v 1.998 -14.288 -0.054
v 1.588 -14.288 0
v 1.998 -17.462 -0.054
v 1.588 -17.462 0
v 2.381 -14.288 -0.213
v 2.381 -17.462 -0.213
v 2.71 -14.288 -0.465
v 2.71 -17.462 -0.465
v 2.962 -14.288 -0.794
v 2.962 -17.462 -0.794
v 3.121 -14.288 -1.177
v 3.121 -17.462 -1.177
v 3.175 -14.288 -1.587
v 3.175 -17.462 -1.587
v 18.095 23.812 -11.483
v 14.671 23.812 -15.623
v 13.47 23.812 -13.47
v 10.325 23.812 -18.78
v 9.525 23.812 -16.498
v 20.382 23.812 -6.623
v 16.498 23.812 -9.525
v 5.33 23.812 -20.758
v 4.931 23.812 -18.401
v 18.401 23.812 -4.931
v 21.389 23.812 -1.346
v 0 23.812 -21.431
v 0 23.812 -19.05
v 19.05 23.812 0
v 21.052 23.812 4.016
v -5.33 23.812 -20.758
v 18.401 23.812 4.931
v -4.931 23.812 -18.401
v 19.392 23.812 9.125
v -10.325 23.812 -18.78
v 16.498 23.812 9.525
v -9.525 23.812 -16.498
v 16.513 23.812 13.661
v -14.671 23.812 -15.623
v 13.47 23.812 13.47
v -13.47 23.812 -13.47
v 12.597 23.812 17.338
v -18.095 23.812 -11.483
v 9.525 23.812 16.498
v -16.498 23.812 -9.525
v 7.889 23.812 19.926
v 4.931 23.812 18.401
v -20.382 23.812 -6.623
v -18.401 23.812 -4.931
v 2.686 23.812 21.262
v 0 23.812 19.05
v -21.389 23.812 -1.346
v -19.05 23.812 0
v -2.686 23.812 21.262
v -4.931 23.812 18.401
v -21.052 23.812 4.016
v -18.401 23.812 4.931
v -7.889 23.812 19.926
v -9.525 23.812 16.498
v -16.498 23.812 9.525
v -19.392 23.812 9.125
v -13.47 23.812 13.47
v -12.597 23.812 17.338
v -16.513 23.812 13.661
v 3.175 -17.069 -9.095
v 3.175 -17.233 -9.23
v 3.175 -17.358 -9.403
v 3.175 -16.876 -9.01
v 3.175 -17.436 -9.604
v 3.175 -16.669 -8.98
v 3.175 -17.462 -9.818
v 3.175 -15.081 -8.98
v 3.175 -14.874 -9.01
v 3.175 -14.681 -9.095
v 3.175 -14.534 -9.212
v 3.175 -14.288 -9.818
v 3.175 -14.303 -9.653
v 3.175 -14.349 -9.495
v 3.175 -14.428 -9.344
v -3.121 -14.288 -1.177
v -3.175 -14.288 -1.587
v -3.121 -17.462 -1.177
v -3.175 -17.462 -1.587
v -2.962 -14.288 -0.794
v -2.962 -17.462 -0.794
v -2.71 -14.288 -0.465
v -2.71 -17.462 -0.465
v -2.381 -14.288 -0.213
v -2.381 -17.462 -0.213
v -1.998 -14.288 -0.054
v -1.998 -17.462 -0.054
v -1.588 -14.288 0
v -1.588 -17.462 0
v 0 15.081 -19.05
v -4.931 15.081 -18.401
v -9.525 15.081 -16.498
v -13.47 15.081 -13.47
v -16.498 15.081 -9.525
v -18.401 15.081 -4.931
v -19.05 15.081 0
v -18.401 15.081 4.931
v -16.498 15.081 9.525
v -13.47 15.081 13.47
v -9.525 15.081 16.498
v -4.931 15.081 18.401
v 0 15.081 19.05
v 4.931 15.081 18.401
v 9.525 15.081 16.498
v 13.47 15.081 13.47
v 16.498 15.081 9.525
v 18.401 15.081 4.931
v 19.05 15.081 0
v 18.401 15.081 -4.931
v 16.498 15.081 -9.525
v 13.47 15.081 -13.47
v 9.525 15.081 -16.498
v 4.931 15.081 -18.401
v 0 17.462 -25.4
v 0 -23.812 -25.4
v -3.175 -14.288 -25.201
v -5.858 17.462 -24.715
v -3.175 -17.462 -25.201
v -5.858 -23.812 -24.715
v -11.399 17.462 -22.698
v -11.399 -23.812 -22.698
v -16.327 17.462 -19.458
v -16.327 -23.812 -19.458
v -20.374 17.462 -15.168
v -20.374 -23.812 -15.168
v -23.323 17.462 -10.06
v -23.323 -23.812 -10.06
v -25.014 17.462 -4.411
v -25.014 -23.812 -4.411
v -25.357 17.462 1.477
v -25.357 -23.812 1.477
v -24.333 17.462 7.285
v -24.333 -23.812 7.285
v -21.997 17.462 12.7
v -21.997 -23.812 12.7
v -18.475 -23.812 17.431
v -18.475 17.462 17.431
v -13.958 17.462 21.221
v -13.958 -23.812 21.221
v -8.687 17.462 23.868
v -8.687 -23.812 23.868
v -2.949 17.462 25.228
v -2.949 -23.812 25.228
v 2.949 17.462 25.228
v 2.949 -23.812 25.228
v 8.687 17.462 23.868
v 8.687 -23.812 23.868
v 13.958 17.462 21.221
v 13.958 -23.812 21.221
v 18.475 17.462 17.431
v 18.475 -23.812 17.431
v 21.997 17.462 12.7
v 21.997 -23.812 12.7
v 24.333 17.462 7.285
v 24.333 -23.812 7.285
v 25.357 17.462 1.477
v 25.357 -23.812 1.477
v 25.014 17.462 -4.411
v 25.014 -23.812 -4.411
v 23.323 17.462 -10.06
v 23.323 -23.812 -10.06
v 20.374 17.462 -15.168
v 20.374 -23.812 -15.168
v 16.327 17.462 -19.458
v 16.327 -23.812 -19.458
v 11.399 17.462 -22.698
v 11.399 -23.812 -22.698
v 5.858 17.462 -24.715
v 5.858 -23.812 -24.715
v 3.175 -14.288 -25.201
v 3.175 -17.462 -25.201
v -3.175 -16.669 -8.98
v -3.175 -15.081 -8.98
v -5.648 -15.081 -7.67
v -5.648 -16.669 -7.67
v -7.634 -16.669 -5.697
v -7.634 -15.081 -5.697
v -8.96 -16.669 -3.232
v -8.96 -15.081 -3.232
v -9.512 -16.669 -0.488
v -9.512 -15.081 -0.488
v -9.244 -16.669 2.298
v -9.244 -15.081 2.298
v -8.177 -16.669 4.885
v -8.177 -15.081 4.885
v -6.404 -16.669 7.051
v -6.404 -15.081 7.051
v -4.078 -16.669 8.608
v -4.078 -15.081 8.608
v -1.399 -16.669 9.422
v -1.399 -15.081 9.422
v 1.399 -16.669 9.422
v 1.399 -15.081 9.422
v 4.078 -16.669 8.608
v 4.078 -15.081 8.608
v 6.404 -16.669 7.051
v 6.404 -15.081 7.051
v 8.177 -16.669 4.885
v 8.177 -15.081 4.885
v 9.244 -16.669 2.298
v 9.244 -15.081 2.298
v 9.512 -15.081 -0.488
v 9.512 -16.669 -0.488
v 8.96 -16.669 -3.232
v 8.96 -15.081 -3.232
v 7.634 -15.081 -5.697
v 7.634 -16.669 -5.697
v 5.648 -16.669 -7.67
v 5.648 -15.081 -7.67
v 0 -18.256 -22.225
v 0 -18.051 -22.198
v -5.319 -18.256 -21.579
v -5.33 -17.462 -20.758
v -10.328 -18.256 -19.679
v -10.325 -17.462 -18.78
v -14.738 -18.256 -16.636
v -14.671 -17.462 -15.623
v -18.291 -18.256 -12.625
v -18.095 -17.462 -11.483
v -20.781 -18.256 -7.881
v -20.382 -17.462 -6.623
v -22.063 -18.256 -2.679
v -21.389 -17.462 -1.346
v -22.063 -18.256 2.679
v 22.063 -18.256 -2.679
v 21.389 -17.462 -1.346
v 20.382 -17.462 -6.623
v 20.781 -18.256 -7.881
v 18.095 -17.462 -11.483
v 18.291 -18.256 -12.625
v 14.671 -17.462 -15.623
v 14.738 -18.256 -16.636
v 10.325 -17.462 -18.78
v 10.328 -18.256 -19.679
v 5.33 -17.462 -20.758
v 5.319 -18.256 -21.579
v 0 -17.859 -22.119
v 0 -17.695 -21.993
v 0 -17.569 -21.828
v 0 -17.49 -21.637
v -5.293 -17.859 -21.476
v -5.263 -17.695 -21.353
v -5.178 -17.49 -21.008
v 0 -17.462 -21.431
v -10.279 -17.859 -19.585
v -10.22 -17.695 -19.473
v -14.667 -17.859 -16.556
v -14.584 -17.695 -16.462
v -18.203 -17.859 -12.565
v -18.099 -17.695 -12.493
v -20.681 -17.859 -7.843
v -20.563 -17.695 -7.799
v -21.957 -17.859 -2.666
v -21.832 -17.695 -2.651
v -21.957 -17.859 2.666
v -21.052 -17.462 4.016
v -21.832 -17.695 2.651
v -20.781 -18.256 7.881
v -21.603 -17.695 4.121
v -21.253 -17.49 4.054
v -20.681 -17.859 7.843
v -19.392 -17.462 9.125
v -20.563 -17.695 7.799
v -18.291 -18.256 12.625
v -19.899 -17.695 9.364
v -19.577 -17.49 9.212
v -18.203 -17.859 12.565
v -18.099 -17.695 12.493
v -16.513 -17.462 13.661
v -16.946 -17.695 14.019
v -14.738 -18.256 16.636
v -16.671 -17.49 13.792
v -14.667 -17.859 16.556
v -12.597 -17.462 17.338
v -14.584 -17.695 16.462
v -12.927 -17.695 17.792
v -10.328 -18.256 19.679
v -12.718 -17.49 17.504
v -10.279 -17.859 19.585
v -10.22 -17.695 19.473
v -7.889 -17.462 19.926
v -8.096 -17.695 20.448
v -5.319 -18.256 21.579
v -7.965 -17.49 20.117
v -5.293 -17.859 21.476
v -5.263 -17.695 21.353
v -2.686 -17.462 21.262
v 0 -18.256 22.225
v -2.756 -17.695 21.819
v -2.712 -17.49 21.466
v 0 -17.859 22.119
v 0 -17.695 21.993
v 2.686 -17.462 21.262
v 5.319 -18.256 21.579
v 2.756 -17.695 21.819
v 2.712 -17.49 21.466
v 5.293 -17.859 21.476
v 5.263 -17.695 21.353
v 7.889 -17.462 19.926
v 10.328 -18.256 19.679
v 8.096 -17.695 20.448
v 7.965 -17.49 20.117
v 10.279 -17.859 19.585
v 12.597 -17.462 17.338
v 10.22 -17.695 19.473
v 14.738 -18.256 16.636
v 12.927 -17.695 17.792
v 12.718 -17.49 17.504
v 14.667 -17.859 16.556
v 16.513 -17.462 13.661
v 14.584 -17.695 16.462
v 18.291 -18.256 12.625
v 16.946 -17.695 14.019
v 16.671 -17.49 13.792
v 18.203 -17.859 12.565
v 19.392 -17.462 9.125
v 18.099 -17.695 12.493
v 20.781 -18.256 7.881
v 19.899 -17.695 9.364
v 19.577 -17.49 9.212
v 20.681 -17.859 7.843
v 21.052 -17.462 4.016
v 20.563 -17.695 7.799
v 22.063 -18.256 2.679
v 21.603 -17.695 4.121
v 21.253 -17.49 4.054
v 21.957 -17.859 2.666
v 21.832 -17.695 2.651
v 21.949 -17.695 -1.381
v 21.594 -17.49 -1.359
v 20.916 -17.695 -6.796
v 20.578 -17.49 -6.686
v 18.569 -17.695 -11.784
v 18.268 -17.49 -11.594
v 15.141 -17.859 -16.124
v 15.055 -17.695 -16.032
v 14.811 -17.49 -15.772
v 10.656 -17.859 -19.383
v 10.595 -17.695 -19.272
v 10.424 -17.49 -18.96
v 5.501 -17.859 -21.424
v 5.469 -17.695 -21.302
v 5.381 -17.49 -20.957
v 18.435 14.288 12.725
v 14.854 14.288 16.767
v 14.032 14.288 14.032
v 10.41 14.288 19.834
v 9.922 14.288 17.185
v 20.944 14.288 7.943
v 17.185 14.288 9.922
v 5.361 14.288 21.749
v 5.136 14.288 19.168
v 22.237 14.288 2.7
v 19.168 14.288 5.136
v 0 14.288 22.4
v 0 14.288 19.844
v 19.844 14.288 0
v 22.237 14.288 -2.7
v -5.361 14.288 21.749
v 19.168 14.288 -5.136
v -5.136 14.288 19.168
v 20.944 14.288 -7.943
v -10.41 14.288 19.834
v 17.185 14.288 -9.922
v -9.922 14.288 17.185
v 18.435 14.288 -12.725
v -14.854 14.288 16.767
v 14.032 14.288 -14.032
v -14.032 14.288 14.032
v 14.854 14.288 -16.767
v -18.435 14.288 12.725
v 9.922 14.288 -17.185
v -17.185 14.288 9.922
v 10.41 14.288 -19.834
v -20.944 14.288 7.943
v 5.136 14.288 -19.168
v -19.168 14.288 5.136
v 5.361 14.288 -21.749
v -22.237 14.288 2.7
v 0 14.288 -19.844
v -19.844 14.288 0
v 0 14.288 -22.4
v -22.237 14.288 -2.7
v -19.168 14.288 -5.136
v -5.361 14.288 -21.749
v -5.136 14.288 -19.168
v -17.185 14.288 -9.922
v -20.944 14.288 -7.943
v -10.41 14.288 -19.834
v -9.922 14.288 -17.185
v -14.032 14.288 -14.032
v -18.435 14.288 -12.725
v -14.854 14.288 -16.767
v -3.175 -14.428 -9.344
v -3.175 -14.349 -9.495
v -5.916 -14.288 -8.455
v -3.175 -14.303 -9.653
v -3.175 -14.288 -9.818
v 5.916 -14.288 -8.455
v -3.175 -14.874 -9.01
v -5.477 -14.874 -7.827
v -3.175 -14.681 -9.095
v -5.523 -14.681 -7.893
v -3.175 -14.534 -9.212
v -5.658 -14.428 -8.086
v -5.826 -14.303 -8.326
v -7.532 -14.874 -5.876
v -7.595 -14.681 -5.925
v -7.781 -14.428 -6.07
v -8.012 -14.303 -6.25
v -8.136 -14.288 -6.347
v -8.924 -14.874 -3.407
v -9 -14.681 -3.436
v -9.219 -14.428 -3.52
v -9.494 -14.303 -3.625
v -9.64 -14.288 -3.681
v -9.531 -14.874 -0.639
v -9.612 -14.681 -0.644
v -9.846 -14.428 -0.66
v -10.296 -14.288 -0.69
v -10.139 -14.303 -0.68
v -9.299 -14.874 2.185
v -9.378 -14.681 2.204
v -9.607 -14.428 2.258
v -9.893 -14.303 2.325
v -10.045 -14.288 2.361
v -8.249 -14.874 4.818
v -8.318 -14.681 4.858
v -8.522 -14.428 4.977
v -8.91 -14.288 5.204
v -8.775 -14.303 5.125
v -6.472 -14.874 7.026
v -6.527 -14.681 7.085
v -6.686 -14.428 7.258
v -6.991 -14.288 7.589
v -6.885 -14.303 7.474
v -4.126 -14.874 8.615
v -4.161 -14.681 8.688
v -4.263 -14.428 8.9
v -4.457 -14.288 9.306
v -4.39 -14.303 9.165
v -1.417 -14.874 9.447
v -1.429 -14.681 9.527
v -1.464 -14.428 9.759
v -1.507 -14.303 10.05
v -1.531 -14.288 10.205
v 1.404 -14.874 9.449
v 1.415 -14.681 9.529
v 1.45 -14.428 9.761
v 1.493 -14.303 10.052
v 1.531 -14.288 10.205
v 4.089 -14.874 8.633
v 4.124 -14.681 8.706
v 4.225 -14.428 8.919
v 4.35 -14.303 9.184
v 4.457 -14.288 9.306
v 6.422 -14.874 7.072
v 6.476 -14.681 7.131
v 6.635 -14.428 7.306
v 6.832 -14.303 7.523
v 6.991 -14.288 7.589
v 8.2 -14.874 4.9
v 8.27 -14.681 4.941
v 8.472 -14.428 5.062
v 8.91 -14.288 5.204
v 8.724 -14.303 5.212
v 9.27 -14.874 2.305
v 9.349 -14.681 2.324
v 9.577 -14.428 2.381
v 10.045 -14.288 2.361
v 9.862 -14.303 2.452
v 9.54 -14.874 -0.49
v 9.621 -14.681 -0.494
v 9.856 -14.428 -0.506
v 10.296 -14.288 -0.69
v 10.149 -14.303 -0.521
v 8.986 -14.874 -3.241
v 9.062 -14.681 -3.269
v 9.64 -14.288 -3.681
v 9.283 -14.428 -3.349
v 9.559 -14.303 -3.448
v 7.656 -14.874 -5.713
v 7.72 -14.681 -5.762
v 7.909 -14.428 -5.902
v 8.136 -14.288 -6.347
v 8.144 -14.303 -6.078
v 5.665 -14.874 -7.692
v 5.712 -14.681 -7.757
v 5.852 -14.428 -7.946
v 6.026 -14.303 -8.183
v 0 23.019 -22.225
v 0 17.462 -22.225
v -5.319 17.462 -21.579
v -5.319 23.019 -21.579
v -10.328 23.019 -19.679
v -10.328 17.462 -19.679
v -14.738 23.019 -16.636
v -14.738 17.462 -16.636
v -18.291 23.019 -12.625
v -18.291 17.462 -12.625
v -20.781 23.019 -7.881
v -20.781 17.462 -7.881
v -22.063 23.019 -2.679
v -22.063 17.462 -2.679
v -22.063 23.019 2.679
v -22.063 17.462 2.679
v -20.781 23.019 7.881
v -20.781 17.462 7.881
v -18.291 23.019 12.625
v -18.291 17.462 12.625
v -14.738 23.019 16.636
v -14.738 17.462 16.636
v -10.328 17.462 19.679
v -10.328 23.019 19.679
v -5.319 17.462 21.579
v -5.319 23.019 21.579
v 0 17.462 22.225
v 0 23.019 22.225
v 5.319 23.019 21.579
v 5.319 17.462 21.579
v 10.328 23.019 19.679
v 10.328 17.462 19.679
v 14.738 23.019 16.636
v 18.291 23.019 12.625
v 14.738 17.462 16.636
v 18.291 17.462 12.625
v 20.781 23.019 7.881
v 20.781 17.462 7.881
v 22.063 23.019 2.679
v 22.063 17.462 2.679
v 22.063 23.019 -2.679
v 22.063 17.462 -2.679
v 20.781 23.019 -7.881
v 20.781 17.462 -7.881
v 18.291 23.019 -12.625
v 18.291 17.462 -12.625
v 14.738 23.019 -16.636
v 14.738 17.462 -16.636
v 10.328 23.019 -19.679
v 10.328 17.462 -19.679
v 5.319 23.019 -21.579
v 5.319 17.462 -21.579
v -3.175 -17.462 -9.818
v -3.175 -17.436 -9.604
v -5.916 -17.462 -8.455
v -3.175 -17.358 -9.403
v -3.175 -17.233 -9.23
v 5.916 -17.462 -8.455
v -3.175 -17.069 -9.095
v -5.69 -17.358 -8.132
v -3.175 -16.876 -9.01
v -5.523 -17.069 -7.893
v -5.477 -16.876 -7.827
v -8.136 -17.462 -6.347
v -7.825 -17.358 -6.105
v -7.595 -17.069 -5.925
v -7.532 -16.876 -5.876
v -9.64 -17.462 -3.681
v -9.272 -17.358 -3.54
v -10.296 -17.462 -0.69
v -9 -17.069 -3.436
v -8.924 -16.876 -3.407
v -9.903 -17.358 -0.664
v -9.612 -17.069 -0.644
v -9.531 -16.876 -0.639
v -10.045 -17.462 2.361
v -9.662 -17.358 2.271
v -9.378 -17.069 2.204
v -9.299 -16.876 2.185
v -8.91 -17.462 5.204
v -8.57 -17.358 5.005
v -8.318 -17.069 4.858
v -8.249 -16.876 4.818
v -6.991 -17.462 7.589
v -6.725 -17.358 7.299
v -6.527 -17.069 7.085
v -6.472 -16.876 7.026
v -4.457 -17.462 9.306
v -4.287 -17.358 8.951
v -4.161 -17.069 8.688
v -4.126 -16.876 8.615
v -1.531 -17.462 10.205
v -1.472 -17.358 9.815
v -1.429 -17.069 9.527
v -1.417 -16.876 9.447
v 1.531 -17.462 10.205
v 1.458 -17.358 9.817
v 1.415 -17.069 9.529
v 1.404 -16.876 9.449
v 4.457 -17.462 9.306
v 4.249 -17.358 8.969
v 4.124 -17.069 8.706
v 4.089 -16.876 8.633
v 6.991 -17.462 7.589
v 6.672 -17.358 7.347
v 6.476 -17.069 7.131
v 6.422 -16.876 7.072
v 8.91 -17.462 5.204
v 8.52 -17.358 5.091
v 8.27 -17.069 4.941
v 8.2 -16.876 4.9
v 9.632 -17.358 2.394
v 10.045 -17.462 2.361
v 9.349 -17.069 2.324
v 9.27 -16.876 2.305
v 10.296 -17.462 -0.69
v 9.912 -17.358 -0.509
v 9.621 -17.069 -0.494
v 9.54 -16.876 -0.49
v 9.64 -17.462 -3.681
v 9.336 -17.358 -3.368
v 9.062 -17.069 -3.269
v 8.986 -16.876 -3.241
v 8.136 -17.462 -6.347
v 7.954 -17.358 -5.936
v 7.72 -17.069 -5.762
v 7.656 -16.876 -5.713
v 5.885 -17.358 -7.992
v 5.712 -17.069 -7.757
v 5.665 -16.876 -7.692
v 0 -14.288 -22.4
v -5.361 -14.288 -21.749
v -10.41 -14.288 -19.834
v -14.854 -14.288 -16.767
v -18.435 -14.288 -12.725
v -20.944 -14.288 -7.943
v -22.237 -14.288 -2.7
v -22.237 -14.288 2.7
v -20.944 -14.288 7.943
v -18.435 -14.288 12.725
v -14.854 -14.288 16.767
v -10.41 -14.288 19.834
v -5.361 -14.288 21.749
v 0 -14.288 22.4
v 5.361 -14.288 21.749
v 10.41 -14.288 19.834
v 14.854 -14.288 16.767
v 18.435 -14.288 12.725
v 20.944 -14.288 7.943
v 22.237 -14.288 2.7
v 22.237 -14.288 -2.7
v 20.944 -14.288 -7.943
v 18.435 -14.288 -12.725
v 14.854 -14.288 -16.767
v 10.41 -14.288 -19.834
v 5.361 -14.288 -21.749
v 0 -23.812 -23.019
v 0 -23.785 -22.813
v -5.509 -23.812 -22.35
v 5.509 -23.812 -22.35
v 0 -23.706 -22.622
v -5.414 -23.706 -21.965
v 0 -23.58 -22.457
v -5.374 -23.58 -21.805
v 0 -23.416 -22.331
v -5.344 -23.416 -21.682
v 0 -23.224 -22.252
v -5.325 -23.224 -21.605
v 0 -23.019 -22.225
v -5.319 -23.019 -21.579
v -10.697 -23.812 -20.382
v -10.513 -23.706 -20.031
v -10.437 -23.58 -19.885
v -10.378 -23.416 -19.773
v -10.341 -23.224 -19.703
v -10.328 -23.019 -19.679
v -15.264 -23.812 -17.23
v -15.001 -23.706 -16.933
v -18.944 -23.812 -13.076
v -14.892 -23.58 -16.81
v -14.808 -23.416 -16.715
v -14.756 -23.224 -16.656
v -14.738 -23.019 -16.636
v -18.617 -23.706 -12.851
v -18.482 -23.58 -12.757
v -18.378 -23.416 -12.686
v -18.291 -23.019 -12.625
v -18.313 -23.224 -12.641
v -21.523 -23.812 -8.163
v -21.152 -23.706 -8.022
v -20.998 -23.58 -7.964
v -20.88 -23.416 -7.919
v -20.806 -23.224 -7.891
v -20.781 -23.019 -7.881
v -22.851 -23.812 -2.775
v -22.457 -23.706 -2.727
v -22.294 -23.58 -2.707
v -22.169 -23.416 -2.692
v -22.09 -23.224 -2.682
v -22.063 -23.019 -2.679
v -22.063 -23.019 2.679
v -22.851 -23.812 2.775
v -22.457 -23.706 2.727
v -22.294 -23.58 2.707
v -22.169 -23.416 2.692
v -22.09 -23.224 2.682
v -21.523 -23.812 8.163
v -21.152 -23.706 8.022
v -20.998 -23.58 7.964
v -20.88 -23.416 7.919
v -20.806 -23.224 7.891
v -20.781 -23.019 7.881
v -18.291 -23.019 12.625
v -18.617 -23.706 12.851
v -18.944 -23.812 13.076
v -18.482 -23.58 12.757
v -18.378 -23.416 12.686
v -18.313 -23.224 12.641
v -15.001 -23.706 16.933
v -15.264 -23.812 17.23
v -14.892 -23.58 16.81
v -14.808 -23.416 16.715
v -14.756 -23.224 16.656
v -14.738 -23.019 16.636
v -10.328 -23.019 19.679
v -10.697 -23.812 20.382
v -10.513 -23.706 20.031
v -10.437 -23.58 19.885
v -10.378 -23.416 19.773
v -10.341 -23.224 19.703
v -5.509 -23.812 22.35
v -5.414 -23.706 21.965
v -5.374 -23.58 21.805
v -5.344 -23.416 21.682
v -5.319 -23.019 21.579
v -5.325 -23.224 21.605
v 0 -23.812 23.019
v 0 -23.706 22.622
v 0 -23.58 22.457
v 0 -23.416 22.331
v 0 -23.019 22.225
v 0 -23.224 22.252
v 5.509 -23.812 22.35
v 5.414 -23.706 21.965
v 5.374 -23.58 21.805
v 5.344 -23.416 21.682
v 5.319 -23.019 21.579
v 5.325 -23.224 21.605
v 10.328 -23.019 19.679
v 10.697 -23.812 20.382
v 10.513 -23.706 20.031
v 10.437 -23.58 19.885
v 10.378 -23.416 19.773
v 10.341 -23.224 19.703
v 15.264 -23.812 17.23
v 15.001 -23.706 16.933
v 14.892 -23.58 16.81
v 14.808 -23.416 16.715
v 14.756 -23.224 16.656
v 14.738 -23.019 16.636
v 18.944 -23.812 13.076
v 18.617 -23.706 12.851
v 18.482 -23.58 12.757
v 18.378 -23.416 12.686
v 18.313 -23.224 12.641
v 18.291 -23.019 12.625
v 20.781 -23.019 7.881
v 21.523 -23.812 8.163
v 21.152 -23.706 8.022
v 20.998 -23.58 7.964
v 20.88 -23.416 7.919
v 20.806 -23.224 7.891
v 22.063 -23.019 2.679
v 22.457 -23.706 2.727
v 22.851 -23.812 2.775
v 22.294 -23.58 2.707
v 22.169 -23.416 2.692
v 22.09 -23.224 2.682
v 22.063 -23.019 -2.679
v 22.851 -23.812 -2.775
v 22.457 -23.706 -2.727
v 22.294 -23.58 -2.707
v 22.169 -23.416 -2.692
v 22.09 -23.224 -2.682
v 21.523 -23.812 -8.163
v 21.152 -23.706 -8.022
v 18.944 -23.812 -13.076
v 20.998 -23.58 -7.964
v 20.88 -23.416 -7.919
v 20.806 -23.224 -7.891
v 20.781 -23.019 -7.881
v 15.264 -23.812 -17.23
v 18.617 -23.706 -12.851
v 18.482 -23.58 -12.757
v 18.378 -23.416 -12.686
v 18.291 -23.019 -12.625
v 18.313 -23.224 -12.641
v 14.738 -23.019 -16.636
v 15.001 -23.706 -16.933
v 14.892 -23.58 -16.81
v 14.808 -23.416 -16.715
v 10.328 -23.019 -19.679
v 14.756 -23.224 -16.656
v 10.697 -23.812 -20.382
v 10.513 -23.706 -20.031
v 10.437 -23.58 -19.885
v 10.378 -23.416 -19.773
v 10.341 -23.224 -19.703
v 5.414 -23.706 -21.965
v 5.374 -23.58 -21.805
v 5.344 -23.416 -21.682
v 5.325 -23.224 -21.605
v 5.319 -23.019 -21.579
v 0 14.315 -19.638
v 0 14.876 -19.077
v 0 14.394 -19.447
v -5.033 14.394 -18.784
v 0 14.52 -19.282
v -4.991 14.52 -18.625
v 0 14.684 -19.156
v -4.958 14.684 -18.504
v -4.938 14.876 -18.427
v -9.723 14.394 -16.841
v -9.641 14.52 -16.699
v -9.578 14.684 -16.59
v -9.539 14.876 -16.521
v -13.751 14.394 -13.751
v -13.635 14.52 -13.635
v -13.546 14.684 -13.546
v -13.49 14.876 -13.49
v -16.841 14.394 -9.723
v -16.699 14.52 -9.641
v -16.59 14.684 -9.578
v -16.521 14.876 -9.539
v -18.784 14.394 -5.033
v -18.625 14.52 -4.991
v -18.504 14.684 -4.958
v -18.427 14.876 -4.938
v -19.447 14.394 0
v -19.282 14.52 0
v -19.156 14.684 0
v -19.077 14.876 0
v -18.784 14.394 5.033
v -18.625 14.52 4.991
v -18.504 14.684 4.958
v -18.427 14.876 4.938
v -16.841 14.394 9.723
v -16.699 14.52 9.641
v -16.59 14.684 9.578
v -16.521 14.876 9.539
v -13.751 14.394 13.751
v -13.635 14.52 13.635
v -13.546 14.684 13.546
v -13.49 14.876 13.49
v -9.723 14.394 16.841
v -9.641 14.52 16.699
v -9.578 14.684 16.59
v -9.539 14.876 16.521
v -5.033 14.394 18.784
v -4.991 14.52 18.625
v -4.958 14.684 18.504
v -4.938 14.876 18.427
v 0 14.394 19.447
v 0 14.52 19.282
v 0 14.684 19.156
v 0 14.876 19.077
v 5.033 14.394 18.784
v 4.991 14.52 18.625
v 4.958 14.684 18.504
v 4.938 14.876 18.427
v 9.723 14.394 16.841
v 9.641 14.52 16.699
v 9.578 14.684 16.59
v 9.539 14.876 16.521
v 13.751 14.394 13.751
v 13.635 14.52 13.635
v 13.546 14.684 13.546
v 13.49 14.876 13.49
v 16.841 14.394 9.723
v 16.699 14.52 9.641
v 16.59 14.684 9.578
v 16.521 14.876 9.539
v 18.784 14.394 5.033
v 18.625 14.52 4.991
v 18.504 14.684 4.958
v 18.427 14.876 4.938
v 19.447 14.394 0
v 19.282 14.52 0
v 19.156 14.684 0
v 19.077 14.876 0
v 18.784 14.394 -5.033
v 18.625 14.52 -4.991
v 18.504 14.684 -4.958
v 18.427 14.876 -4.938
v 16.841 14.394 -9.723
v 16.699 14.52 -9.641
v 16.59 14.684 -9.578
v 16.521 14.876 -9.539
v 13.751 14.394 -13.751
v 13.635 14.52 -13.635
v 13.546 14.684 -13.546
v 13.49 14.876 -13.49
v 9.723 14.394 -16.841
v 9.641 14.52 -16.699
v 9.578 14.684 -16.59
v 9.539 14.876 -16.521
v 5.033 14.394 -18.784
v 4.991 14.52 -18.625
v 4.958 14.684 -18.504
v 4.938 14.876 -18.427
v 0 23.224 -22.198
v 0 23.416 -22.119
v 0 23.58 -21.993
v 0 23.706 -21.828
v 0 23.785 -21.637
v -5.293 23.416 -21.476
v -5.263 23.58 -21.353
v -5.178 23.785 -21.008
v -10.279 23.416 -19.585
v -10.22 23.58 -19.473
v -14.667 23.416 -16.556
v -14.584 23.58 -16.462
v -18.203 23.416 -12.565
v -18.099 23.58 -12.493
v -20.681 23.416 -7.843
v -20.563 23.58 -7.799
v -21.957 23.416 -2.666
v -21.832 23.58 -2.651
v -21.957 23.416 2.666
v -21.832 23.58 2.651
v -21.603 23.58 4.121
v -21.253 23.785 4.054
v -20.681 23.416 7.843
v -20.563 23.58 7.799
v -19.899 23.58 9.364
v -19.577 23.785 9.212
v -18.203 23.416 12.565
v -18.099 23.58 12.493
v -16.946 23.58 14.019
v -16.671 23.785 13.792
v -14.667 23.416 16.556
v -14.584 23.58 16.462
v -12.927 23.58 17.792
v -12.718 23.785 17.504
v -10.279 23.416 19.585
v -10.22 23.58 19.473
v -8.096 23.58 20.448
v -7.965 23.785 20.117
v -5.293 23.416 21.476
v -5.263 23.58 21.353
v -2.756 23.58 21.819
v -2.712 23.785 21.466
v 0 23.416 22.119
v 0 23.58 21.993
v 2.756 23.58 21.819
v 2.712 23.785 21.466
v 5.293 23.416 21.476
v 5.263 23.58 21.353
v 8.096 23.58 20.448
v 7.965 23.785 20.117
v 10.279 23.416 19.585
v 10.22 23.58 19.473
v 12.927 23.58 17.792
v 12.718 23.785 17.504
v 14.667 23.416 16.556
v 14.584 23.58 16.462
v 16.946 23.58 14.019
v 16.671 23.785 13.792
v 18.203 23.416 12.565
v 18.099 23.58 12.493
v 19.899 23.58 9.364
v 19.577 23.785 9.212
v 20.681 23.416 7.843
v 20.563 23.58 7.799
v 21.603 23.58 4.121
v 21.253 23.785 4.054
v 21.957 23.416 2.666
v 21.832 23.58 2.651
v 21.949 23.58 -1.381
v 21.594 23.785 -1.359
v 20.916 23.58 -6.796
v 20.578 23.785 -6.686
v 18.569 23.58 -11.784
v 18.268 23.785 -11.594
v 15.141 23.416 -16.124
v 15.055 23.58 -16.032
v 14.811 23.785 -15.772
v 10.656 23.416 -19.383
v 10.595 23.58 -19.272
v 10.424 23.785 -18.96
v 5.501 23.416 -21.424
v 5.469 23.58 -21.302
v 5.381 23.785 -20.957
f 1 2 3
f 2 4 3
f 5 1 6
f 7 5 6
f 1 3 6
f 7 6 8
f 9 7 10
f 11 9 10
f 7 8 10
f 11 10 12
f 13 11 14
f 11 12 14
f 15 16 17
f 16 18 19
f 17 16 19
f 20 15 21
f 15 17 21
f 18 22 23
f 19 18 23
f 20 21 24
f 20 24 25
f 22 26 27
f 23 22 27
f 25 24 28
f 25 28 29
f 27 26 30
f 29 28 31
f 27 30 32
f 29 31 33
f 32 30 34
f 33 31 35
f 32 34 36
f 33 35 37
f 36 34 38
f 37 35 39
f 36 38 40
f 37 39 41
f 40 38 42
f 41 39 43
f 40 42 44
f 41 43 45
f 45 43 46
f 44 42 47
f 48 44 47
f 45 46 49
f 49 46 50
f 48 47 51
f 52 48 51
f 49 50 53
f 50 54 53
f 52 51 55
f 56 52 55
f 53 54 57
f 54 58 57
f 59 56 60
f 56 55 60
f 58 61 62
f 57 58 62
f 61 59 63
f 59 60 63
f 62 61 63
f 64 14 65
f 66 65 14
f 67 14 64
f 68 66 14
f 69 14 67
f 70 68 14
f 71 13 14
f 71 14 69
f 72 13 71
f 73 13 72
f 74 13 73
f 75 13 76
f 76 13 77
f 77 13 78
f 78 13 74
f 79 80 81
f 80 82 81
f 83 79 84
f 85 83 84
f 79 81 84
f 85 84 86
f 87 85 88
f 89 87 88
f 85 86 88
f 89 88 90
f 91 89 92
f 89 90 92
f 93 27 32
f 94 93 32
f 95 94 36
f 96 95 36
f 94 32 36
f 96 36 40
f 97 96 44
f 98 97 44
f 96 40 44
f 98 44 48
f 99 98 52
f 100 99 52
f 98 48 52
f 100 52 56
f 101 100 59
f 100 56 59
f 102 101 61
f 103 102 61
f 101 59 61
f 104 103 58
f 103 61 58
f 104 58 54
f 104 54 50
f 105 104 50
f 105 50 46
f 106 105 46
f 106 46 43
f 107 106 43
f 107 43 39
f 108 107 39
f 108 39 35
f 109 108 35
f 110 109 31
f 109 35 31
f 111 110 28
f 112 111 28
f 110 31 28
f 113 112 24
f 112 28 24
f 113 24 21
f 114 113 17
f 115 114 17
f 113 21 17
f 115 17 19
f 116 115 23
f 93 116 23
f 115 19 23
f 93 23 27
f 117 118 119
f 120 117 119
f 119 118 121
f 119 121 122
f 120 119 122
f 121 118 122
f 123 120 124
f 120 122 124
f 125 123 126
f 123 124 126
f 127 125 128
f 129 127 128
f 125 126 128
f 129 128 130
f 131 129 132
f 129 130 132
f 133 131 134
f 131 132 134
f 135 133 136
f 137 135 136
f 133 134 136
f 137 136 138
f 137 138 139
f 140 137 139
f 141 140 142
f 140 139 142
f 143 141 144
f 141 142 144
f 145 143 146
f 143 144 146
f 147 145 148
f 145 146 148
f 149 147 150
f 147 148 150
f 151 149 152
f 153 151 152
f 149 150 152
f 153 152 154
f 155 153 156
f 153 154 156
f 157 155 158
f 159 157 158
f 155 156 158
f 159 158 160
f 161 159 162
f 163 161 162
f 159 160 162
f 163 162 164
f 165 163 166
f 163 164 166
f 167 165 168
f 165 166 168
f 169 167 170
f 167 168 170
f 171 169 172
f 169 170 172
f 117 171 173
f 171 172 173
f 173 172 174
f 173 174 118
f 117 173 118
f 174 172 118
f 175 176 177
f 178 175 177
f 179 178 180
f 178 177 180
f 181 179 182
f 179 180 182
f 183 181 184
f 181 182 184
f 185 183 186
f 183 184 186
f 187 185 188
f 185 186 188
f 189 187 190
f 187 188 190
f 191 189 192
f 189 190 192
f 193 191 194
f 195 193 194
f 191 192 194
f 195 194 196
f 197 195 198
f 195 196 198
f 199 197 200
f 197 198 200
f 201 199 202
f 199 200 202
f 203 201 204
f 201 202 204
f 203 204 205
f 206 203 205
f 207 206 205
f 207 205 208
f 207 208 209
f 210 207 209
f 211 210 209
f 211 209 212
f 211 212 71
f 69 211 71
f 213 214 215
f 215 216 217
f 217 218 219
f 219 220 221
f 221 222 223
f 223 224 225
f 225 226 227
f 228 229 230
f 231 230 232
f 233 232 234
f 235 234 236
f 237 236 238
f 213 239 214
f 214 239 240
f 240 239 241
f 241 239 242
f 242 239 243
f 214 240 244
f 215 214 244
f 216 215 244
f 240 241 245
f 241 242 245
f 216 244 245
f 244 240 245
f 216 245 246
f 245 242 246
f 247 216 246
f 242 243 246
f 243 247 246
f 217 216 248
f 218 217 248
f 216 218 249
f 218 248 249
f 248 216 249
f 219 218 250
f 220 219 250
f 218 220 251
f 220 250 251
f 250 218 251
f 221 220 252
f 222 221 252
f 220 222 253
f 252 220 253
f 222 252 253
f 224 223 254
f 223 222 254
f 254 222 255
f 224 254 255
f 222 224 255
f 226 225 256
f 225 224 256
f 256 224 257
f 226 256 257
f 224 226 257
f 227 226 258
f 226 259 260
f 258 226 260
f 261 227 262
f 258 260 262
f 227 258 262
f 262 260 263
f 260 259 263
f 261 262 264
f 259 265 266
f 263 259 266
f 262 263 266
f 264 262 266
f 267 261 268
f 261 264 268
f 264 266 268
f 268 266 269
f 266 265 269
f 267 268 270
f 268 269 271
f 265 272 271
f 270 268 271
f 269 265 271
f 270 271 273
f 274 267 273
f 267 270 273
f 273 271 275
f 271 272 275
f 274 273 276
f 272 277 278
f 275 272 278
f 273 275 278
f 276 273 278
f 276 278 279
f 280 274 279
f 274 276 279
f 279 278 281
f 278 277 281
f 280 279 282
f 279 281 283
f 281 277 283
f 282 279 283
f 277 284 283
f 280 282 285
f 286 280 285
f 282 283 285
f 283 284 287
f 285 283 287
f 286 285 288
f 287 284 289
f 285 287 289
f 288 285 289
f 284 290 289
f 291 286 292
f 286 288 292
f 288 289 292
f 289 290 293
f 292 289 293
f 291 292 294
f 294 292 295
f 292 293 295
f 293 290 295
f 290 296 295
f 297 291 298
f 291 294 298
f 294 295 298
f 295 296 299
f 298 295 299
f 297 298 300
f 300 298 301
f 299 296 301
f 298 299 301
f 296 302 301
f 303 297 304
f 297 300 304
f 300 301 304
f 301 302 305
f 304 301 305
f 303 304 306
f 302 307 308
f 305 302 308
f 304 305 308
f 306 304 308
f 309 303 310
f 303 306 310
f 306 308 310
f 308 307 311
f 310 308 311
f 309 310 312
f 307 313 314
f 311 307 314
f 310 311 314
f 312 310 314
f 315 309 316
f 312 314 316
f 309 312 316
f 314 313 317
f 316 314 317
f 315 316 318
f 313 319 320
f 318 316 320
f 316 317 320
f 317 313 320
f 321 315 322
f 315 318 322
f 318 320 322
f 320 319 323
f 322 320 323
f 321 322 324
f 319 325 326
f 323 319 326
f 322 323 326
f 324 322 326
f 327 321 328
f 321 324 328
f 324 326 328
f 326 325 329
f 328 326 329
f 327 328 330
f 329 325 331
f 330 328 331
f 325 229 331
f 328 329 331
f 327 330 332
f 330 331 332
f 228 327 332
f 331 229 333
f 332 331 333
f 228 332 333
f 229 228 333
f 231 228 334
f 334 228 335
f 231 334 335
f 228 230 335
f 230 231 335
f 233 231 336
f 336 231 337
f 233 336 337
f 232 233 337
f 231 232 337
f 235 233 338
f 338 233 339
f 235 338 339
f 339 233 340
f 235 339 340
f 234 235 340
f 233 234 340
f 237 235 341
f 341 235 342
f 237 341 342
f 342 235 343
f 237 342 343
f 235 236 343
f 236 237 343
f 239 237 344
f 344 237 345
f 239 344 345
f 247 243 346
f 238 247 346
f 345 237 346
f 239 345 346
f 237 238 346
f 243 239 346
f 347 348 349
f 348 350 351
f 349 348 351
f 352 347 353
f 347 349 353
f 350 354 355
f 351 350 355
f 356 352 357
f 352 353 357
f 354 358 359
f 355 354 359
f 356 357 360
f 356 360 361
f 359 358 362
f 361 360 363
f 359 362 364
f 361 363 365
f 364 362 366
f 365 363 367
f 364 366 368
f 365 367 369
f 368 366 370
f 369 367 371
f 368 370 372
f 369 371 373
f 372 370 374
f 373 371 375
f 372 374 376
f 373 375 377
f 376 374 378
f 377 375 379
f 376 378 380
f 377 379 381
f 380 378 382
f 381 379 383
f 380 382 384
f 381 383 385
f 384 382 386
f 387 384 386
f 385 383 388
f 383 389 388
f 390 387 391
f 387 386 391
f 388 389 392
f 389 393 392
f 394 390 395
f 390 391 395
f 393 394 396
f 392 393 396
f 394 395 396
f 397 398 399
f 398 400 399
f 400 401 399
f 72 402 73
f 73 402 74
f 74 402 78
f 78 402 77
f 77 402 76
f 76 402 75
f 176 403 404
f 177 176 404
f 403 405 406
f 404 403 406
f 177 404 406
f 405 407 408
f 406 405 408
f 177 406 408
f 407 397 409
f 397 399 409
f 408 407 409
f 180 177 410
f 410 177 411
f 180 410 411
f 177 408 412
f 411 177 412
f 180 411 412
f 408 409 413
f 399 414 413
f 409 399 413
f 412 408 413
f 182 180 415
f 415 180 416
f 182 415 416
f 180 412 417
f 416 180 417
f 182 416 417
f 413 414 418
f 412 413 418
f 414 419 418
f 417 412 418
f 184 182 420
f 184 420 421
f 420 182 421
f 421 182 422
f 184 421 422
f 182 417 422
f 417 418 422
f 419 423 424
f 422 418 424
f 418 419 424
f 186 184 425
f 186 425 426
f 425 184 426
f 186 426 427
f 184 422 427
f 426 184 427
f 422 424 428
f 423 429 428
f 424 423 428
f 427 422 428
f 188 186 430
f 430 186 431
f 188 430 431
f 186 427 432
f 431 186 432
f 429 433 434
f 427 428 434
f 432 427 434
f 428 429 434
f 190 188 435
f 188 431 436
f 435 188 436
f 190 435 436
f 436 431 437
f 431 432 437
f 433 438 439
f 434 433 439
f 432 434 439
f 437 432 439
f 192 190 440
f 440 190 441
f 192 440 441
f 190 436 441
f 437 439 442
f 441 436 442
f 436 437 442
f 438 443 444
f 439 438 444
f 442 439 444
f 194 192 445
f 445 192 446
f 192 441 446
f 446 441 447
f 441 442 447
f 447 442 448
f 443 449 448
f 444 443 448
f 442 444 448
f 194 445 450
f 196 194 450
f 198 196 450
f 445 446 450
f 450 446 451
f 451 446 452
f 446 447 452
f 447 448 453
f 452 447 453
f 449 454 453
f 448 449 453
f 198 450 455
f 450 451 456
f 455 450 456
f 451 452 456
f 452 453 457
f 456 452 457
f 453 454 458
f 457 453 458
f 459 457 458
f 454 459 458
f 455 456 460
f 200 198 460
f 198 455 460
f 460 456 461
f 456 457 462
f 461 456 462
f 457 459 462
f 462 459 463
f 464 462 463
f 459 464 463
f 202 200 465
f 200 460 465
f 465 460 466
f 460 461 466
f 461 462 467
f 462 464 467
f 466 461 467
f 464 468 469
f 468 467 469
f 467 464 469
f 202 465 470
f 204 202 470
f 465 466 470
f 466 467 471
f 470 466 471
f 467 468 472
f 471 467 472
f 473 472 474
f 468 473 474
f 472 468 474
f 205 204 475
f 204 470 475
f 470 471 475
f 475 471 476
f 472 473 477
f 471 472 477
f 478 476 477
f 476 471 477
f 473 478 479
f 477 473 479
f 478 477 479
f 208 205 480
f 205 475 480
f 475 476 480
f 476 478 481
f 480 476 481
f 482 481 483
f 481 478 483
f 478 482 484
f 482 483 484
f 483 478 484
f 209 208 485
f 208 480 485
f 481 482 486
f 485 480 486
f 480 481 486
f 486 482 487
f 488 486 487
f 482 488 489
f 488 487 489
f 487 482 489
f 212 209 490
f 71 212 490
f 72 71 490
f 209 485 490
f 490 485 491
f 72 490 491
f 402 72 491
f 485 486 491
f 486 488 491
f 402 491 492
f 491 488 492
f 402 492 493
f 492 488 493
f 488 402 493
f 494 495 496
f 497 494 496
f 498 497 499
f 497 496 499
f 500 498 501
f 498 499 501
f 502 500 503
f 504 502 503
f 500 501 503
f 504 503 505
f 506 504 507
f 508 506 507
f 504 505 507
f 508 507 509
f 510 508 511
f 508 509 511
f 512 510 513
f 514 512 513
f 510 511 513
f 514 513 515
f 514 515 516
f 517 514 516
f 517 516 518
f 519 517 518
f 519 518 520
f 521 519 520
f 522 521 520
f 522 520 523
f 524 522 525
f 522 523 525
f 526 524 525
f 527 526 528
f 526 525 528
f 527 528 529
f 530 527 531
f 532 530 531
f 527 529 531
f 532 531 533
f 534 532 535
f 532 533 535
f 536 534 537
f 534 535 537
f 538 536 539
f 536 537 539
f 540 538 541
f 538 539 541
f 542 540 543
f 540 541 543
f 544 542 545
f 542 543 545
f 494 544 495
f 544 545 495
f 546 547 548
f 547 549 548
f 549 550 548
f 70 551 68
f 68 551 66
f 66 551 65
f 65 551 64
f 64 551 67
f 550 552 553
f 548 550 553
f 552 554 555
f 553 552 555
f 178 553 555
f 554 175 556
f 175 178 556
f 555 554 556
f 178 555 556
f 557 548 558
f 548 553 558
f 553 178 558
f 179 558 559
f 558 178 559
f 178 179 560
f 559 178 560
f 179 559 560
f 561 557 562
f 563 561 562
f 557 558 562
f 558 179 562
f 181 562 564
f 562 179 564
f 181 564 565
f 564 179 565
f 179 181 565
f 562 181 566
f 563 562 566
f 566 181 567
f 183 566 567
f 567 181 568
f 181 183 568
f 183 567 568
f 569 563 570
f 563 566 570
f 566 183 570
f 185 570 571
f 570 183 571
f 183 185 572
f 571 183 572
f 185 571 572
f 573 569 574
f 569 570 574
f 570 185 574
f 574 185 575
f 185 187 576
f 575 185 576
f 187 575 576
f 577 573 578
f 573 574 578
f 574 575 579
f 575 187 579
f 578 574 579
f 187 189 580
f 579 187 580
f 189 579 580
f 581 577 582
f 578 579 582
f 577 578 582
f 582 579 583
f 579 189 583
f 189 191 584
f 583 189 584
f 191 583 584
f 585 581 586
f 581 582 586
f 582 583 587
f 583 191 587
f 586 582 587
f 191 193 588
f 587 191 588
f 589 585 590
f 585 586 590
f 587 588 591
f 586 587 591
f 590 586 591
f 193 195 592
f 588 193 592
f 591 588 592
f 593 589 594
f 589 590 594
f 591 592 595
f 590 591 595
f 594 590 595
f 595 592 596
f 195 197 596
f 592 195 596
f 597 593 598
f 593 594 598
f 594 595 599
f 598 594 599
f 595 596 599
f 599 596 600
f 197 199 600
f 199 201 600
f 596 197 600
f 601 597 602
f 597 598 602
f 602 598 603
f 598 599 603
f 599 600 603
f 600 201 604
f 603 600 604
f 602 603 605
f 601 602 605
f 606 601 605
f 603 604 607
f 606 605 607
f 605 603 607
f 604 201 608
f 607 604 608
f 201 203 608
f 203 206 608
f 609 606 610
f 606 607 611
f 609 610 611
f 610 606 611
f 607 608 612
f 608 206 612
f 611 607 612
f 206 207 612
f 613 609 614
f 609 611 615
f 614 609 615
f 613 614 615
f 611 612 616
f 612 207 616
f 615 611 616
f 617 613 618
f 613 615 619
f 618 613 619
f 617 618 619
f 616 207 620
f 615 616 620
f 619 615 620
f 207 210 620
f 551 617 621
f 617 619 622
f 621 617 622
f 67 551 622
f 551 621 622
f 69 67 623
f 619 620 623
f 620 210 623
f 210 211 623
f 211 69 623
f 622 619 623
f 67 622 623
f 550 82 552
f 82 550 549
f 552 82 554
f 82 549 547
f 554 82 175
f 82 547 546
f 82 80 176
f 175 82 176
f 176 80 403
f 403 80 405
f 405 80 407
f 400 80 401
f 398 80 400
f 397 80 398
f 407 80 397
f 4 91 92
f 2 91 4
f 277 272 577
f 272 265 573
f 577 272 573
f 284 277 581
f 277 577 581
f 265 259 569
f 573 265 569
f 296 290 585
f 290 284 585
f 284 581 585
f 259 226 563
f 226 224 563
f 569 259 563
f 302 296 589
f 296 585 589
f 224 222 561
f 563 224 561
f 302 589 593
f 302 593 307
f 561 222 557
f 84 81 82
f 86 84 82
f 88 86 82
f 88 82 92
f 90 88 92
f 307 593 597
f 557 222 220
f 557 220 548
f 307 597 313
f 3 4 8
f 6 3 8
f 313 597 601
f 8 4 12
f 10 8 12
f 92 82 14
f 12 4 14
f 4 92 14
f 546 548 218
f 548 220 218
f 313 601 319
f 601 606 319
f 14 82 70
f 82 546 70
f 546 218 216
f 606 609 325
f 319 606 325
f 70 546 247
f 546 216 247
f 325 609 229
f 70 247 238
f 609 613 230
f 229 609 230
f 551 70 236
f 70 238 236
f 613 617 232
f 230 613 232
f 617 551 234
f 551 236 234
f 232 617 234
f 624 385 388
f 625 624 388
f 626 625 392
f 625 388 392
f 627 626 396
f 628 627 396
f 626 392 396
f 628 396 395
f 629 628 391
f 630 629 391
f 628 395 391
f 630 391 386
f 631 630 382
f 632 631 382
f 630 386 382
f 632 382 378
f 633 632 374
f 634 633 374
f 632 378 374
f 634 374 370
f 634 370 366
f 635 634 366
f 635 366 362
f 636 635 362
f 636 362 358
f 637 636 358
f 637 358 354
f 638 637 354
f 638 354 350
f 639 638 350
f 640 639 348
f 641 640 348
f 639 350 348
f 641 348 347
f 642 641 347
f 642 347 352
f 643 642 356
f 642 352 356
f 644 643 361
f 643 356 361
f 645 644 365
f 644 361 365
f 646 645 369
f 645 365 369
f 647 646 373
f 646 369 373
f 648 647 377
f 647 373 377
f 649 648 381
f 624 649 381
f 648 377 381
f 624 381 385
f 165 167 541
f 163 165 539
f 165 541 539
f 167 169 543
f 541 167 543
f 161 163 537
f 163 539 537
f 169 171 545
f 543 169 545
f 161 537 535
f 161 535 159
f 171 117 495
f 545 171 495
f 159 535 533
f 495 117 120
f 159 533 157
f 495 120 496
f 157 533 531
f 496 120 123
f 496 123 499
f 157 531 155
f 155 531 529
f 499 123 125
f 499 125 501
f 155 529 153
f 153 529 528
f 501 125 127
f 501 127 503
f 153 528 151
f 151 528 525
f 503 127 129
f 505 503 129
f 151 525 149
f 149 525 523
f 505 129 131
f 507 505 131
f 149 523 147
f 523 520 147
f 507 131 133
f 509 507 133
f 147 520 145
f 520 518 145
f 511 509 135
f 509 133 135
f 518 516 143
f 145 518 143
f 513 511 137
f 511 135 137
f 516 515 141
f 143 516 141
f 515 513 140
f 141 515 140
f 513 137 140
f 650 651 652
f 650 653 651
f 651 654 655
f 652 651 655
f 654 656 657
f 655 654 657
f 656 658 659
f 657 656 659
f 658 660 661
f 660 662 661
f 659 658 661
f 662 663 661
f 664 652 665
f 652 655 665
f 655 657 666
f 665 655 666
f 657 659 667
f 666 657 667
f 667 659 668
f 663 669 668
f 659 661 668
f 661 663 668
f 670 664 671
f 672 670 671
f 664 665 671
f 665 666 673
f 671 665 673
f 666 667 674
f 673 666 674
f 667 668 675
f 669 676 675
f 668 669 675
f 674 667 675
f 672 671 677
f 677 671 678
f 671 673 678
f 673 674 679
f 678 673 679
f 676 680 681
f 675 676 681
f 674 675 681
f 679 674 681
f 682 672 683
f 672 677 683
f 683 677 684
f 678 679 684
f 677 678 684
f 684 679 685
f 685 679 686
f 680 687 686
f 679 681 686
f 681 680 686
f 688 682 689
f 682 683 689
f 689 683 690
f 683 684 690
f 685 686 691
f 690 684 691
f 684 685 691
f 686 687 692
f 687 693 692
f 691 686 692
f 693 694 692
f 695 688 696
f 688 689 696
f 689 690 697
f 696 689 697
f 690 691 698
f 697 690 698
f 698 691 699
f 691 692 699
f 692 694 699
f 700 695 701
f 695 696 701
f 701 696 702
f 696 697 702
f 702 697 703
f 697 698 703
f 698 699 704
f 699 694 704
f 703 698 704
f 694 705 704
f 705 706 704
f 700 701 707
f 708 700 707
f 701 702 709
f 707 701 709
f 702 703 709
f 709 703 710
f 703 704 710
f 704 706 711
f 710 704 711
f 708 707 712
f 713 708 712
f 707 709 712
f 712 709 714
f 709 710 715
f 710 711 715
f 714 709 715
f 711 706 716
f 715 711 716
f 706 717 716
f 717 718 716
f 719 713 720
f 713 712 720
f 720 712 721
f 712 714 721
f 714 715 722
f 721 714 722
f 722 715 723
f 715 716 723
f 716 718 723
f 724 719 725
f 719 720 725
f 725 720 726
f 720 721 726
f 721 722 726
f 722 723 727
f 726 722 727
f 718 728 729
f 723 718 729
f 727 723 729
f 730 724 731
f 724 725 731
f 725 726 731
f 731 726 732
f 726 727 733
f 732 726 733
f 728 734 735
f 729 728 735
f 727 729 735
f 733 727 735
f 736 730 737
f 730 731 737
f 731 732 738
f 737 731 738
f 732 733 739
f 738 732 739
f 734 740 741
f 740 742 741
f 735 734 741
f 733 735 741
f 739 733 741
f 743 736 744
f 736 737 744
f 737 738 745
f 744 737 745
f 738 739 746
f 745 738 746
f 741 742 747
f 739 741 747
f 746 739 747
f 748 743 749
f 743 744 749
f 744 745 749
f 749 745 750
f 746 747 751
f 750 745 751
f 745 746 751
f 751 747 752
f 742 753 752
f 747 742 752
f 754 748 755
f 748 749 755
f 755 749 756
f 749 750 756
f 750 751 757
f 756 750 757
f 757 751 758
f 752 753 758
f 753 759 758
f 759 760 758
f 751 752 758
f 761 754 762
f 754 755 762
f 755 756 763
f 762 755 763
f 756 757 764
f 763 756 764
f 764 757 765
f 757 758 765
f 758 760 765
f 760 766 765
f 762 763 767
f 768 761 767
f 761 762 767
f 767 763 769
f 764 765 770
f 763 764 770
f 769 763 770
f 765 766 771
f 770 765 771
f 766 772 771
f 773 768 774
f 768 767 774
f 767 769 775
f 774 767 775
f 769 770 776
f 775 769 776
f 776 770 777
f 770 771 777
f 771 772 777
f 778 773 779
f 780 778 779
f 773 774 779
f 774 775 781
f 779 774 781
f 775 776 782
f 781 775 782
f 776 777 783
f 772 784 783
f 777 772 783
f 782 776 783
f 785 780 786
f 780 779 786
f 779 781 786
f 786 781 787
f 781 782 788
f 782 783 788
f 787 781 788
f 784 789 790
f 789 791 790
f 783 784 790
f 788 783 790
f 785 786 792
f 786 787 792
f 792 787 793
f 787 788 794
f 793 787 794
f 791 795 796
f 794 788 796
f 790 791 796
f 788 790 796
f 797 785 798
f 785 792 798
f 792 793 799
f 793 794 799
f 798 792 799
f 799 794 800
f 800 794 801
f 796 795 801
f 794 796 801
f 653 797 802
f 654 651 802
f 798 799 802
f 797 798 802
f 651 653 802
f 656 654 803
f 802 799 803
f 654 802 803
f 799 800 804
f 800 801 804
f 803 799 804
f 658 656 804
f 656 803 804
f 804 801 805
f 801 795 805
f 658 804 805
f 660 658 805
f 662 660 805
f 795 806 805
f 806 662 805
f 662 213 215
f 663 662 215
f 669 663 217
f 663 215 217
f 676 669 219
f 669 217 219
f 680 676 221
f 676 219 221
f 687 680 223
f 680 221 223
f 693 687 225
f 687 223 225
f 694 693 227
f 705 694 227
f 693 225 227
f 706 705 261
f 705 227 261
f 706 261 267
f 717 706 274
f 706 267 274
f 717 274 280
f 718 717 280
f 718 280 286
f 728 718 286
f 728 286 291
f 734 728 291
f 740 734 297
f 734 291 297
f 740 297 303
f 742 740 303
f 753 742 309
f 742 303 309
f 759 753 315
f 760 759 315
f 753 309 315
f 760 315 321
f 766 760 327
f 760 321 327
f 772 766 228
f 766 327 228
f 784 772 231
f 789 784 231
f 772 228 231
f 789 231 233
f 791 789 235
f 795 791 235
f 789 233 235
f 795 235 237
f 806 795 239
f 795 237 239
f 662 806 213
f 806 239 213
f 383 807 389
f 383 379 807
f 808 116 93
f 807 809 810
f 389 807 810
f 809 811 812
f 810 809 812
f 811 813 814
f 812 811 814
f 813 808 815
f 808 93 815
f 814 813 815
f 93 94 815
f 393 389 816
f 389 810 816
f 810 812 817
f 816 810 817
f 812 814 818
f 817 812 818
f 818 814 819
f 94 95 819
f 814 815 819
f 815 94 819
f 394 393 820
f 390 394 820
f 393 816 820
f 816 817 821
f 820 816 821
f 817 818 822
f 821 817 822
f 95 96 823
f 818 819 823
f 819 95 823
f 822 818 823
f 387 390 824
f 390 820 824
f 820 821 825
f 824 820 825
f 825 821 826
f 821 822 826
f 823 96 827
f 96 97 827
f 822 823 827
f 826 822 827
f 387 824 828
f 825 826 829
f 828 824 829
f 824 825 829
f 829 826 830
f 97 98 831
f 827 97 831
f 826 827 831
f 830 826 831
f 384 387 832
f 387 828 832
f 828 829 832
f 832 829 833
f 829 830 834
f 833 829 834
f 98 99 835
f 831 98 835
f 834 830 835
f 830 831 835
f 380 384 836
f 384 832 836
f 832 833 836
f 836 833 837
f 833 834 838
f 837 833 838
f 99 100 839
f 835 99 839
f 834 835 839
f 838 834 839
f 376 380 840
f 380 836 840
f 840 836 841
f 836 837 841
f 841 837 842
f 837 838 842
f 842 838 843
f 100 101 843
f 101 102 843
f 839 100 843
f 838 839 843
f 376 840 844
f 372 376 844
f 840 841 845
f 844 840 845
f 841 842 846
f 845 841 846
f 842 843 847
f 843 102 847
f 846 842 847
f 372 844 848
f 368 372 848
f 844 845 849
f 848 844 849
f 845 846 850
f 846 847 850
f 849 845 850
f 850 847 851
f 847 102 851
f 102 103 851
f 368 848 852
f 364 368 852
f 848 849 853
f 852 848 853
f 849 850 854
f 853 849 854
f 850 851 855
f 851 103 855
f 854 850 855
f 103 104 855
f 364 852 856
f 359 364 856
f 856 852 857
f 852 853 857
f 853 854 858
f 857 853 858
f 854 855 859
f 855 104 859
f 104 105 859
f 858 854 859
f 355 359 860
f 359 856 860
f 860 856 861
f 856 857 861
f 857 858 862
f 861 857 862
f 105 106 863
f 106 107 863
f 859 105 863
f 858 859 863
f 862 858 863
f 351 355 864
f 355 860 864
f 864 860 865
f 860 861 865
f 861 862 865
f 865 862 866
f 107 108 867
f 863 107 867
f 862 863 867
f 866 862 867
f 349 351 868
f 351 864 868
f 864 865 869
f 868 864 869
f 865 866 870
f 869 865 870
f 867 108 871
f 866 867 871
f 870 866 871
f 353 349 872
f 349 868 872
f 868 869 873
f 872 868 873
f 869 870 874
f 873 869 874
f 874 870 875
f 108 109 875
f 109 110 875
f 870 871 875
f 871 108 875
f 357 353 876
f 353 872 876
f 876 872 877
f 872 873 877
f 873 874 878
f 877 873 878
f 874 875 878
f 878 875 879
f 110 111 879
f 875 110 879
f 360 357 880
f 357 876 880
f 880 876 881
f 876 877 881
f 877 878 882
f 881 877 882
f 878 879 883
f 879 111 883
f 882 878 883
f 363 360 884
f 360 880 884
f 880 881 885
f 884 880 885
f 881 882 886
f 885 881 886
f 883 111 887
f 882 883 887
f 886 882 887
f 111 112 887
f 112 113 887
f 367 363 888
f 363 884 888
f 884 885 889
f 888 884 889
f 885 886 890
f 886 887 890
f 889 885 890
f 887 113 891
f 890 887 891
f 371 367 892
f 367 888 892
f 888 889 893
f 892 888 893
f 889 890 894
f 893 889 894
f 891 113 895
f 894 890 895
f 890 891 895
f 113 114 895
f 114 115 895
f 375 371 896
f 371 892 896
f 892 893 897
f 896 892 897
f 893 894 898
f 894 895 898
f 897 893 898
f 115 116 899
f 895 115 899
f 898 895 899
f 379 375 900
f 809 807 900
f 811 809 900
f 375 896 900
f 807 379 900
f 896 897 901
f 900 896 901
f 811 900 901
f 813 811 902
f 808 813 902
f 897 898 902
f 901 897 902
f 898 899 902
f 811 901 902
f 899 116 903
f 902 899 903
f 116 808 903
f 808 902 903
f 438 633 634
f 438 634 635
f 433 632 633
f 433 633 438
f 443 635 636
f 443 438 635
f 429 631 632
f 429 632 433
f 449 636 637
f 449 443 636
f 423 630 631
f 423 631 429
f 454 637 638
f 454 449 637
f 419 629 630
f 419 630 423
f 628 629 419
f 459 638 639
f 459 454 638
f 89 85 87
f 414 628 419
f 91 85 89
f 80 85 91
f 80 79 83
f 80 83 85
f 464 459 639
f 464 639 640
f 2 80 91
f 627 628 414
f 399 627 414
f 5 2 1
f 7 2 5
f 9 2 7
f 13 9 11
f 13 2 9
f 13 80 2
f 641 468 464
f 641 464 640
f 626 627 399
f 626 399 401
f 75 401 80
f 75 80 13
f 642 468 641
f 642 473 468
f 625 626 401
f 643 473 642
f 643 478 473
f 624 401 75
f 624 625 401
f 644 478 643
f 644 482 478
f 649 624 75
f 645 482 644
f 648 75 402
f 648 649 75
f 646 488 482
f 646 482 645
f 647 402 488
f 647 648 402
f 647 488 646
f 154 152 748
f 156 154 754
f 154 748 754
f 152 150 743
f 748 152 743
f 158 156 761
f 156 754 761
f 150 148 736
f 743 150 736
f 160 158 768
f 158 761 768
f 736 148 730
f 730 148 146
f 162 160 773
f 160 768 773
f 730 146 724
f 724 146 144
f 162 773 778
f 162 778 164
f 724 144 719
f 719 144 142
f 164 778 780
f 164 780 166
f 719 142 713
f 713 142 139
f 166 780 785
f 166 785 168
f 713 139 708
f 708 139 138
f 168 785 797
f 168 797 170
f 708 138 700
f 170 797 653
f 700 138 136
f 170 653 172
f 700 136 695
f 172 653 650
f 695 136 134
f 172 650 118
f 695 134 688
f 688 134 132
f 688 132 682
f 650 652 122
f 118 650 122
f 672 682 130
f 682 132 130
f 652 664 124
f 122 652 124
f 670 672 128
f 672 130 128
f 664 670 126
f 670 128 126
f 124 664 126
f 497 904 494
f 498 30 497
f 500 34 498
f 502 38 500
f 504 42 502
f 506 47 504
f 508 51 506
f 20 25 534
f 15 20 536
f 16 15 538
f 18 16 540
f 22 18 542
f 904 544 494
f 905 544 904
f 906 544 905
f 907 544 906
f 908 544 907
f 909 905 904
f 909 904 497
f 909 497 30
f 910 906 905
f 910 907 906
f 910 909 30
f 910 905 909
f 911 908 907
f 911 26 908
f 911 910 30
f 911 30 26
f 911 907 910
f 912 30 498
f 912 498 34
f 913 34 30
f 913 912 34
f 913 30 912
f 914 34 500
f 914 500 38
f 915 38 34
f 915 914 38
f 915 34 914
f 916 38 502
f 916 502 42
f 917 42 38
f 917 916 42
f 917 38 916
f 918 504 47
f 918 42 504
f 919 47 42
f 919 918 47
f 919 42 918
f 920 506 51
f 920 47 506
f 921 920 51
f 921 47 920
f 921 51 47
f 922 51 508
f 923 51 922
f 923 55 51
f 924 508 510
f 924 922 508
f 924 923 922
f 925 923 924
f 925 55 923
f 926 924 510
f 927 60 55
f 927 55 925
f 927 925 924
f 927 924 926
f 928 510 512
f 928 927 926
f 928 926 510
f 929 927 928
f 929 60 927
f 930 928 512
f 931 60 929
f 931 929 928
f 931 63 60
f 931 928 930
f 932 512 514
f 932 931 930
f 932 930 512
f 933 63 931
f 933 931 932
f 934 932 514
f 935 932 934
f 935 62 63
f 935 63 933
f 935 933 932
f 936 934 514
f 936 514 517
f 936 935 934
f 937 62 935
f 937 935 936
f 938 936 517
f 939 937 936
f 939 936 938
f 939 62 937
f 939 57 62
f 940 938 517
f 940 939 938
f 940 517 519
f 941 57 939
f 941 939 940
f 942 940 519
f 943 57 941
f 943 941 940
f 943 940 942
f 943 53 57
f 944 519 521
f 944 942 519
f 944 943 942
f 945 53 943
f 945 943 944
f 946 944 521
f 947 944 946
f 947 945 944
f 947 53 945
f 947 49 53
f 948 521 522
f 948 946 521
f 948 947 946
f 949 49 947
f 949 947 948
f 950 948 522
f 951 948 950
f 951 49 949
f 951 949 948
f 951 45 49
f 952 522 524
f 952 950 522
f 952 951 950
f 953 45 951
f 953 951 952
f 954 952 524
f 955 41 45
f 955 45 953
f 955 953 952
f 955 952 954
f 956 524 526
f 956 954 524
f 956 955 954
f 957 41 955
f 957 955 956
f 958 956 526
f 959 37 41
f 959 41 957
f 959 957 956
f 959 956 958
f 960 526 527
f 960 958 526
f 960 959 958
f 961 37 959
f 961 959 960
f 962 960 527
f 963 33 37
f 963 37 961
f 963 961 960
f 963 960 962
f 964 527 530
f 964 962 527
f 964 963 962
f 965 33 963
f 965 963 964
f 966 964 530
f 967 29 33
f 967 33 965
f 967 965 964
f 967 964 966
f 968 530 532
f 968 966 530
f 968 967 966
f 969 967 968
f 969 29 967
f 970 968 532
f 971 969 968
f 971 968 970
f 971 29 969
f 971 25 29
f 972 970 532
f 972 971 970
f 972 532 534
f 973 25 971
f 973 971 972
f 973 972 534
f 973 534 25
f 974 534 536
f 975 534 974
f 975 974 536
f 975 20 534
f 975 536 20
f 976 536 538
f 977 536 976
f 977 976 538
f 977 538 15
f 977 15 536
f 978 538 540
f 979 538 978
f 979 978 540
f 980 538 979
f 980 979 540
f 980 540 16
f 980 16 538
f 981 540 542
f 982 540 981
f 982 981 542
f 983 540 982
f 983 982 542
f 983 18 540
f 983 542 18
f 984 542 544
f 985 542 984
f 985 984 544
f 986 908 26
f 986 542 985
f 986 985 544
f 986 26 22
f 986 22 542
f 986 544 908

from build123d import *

# Parameters (mm, degrees)
FILLET1_R           = 0.79375
SKETCH2_W           = 6.35
SKETCH2_H           = 25.200781238
BOSS_EXTRUDE1_DEPTH = 3.175
FILLET2_R           = 1.5875


with BuildPart() as part:
    # Sketch1 → Revolve1 (revolve)
    with BuildSketch(Plane(origin=(0, 0, 0), x_dir=(0, 0, -1), z_dir=(1, 0, 0))):
        Polygon((22.225, 23.8125), (22.225, 17.4625), (25.4, 17.4625), (25.4, -23.8125), (22.225, -23.8125), (22.225, -17.4625), (9.525, -17.4625), (9.525, -14.2875), (22.4, -14.2875), (22.4, 14.2875), (19.05, 14.2875), (19.05, 23.8125), align=None)
    revolve(axis=Axis((0, -32.325211936, 0), (0, 1, 0)))

    # Fillet1
    fillet1_edges = [part.edges().sort_by_distance(p)[0] for p in [
        (0, -14.2875, 9.525),
        (0, -17.4625, 9.525),
        (0, -17.4625, 22.225),
        (0, -23.8125, 22.225),
        (0, 23.8125, 22.225),
        (0, 14.2875, 19.05),
    ]]
    fillet(fillet1_edges, radius=FILLET1_R)

    # Sketch2 → Boss-Extrude1 (add)
    with BuildSketch(Plane(origin=(0, -14.2875, 0), x_dir=(1, 0, 0), z_dir=(0, 1, 0))):
        with Locations((0, 12.600390619)):
            Rectangle(SKETCH2_W, SKETCH2_H)
    extrude(amount=-BOSS_EXTRUDE1_DEPTH)

    # Fillet2
    fillet2_edges = [part.edges().sort_by_distance(p)[0] for p in [
        (3.175, -15.875, 0),
        (-3.175, -15.875, 0),
    ]]
    fillet(fillet2_edges, radius=FILLET2_R)


solid = part.part
